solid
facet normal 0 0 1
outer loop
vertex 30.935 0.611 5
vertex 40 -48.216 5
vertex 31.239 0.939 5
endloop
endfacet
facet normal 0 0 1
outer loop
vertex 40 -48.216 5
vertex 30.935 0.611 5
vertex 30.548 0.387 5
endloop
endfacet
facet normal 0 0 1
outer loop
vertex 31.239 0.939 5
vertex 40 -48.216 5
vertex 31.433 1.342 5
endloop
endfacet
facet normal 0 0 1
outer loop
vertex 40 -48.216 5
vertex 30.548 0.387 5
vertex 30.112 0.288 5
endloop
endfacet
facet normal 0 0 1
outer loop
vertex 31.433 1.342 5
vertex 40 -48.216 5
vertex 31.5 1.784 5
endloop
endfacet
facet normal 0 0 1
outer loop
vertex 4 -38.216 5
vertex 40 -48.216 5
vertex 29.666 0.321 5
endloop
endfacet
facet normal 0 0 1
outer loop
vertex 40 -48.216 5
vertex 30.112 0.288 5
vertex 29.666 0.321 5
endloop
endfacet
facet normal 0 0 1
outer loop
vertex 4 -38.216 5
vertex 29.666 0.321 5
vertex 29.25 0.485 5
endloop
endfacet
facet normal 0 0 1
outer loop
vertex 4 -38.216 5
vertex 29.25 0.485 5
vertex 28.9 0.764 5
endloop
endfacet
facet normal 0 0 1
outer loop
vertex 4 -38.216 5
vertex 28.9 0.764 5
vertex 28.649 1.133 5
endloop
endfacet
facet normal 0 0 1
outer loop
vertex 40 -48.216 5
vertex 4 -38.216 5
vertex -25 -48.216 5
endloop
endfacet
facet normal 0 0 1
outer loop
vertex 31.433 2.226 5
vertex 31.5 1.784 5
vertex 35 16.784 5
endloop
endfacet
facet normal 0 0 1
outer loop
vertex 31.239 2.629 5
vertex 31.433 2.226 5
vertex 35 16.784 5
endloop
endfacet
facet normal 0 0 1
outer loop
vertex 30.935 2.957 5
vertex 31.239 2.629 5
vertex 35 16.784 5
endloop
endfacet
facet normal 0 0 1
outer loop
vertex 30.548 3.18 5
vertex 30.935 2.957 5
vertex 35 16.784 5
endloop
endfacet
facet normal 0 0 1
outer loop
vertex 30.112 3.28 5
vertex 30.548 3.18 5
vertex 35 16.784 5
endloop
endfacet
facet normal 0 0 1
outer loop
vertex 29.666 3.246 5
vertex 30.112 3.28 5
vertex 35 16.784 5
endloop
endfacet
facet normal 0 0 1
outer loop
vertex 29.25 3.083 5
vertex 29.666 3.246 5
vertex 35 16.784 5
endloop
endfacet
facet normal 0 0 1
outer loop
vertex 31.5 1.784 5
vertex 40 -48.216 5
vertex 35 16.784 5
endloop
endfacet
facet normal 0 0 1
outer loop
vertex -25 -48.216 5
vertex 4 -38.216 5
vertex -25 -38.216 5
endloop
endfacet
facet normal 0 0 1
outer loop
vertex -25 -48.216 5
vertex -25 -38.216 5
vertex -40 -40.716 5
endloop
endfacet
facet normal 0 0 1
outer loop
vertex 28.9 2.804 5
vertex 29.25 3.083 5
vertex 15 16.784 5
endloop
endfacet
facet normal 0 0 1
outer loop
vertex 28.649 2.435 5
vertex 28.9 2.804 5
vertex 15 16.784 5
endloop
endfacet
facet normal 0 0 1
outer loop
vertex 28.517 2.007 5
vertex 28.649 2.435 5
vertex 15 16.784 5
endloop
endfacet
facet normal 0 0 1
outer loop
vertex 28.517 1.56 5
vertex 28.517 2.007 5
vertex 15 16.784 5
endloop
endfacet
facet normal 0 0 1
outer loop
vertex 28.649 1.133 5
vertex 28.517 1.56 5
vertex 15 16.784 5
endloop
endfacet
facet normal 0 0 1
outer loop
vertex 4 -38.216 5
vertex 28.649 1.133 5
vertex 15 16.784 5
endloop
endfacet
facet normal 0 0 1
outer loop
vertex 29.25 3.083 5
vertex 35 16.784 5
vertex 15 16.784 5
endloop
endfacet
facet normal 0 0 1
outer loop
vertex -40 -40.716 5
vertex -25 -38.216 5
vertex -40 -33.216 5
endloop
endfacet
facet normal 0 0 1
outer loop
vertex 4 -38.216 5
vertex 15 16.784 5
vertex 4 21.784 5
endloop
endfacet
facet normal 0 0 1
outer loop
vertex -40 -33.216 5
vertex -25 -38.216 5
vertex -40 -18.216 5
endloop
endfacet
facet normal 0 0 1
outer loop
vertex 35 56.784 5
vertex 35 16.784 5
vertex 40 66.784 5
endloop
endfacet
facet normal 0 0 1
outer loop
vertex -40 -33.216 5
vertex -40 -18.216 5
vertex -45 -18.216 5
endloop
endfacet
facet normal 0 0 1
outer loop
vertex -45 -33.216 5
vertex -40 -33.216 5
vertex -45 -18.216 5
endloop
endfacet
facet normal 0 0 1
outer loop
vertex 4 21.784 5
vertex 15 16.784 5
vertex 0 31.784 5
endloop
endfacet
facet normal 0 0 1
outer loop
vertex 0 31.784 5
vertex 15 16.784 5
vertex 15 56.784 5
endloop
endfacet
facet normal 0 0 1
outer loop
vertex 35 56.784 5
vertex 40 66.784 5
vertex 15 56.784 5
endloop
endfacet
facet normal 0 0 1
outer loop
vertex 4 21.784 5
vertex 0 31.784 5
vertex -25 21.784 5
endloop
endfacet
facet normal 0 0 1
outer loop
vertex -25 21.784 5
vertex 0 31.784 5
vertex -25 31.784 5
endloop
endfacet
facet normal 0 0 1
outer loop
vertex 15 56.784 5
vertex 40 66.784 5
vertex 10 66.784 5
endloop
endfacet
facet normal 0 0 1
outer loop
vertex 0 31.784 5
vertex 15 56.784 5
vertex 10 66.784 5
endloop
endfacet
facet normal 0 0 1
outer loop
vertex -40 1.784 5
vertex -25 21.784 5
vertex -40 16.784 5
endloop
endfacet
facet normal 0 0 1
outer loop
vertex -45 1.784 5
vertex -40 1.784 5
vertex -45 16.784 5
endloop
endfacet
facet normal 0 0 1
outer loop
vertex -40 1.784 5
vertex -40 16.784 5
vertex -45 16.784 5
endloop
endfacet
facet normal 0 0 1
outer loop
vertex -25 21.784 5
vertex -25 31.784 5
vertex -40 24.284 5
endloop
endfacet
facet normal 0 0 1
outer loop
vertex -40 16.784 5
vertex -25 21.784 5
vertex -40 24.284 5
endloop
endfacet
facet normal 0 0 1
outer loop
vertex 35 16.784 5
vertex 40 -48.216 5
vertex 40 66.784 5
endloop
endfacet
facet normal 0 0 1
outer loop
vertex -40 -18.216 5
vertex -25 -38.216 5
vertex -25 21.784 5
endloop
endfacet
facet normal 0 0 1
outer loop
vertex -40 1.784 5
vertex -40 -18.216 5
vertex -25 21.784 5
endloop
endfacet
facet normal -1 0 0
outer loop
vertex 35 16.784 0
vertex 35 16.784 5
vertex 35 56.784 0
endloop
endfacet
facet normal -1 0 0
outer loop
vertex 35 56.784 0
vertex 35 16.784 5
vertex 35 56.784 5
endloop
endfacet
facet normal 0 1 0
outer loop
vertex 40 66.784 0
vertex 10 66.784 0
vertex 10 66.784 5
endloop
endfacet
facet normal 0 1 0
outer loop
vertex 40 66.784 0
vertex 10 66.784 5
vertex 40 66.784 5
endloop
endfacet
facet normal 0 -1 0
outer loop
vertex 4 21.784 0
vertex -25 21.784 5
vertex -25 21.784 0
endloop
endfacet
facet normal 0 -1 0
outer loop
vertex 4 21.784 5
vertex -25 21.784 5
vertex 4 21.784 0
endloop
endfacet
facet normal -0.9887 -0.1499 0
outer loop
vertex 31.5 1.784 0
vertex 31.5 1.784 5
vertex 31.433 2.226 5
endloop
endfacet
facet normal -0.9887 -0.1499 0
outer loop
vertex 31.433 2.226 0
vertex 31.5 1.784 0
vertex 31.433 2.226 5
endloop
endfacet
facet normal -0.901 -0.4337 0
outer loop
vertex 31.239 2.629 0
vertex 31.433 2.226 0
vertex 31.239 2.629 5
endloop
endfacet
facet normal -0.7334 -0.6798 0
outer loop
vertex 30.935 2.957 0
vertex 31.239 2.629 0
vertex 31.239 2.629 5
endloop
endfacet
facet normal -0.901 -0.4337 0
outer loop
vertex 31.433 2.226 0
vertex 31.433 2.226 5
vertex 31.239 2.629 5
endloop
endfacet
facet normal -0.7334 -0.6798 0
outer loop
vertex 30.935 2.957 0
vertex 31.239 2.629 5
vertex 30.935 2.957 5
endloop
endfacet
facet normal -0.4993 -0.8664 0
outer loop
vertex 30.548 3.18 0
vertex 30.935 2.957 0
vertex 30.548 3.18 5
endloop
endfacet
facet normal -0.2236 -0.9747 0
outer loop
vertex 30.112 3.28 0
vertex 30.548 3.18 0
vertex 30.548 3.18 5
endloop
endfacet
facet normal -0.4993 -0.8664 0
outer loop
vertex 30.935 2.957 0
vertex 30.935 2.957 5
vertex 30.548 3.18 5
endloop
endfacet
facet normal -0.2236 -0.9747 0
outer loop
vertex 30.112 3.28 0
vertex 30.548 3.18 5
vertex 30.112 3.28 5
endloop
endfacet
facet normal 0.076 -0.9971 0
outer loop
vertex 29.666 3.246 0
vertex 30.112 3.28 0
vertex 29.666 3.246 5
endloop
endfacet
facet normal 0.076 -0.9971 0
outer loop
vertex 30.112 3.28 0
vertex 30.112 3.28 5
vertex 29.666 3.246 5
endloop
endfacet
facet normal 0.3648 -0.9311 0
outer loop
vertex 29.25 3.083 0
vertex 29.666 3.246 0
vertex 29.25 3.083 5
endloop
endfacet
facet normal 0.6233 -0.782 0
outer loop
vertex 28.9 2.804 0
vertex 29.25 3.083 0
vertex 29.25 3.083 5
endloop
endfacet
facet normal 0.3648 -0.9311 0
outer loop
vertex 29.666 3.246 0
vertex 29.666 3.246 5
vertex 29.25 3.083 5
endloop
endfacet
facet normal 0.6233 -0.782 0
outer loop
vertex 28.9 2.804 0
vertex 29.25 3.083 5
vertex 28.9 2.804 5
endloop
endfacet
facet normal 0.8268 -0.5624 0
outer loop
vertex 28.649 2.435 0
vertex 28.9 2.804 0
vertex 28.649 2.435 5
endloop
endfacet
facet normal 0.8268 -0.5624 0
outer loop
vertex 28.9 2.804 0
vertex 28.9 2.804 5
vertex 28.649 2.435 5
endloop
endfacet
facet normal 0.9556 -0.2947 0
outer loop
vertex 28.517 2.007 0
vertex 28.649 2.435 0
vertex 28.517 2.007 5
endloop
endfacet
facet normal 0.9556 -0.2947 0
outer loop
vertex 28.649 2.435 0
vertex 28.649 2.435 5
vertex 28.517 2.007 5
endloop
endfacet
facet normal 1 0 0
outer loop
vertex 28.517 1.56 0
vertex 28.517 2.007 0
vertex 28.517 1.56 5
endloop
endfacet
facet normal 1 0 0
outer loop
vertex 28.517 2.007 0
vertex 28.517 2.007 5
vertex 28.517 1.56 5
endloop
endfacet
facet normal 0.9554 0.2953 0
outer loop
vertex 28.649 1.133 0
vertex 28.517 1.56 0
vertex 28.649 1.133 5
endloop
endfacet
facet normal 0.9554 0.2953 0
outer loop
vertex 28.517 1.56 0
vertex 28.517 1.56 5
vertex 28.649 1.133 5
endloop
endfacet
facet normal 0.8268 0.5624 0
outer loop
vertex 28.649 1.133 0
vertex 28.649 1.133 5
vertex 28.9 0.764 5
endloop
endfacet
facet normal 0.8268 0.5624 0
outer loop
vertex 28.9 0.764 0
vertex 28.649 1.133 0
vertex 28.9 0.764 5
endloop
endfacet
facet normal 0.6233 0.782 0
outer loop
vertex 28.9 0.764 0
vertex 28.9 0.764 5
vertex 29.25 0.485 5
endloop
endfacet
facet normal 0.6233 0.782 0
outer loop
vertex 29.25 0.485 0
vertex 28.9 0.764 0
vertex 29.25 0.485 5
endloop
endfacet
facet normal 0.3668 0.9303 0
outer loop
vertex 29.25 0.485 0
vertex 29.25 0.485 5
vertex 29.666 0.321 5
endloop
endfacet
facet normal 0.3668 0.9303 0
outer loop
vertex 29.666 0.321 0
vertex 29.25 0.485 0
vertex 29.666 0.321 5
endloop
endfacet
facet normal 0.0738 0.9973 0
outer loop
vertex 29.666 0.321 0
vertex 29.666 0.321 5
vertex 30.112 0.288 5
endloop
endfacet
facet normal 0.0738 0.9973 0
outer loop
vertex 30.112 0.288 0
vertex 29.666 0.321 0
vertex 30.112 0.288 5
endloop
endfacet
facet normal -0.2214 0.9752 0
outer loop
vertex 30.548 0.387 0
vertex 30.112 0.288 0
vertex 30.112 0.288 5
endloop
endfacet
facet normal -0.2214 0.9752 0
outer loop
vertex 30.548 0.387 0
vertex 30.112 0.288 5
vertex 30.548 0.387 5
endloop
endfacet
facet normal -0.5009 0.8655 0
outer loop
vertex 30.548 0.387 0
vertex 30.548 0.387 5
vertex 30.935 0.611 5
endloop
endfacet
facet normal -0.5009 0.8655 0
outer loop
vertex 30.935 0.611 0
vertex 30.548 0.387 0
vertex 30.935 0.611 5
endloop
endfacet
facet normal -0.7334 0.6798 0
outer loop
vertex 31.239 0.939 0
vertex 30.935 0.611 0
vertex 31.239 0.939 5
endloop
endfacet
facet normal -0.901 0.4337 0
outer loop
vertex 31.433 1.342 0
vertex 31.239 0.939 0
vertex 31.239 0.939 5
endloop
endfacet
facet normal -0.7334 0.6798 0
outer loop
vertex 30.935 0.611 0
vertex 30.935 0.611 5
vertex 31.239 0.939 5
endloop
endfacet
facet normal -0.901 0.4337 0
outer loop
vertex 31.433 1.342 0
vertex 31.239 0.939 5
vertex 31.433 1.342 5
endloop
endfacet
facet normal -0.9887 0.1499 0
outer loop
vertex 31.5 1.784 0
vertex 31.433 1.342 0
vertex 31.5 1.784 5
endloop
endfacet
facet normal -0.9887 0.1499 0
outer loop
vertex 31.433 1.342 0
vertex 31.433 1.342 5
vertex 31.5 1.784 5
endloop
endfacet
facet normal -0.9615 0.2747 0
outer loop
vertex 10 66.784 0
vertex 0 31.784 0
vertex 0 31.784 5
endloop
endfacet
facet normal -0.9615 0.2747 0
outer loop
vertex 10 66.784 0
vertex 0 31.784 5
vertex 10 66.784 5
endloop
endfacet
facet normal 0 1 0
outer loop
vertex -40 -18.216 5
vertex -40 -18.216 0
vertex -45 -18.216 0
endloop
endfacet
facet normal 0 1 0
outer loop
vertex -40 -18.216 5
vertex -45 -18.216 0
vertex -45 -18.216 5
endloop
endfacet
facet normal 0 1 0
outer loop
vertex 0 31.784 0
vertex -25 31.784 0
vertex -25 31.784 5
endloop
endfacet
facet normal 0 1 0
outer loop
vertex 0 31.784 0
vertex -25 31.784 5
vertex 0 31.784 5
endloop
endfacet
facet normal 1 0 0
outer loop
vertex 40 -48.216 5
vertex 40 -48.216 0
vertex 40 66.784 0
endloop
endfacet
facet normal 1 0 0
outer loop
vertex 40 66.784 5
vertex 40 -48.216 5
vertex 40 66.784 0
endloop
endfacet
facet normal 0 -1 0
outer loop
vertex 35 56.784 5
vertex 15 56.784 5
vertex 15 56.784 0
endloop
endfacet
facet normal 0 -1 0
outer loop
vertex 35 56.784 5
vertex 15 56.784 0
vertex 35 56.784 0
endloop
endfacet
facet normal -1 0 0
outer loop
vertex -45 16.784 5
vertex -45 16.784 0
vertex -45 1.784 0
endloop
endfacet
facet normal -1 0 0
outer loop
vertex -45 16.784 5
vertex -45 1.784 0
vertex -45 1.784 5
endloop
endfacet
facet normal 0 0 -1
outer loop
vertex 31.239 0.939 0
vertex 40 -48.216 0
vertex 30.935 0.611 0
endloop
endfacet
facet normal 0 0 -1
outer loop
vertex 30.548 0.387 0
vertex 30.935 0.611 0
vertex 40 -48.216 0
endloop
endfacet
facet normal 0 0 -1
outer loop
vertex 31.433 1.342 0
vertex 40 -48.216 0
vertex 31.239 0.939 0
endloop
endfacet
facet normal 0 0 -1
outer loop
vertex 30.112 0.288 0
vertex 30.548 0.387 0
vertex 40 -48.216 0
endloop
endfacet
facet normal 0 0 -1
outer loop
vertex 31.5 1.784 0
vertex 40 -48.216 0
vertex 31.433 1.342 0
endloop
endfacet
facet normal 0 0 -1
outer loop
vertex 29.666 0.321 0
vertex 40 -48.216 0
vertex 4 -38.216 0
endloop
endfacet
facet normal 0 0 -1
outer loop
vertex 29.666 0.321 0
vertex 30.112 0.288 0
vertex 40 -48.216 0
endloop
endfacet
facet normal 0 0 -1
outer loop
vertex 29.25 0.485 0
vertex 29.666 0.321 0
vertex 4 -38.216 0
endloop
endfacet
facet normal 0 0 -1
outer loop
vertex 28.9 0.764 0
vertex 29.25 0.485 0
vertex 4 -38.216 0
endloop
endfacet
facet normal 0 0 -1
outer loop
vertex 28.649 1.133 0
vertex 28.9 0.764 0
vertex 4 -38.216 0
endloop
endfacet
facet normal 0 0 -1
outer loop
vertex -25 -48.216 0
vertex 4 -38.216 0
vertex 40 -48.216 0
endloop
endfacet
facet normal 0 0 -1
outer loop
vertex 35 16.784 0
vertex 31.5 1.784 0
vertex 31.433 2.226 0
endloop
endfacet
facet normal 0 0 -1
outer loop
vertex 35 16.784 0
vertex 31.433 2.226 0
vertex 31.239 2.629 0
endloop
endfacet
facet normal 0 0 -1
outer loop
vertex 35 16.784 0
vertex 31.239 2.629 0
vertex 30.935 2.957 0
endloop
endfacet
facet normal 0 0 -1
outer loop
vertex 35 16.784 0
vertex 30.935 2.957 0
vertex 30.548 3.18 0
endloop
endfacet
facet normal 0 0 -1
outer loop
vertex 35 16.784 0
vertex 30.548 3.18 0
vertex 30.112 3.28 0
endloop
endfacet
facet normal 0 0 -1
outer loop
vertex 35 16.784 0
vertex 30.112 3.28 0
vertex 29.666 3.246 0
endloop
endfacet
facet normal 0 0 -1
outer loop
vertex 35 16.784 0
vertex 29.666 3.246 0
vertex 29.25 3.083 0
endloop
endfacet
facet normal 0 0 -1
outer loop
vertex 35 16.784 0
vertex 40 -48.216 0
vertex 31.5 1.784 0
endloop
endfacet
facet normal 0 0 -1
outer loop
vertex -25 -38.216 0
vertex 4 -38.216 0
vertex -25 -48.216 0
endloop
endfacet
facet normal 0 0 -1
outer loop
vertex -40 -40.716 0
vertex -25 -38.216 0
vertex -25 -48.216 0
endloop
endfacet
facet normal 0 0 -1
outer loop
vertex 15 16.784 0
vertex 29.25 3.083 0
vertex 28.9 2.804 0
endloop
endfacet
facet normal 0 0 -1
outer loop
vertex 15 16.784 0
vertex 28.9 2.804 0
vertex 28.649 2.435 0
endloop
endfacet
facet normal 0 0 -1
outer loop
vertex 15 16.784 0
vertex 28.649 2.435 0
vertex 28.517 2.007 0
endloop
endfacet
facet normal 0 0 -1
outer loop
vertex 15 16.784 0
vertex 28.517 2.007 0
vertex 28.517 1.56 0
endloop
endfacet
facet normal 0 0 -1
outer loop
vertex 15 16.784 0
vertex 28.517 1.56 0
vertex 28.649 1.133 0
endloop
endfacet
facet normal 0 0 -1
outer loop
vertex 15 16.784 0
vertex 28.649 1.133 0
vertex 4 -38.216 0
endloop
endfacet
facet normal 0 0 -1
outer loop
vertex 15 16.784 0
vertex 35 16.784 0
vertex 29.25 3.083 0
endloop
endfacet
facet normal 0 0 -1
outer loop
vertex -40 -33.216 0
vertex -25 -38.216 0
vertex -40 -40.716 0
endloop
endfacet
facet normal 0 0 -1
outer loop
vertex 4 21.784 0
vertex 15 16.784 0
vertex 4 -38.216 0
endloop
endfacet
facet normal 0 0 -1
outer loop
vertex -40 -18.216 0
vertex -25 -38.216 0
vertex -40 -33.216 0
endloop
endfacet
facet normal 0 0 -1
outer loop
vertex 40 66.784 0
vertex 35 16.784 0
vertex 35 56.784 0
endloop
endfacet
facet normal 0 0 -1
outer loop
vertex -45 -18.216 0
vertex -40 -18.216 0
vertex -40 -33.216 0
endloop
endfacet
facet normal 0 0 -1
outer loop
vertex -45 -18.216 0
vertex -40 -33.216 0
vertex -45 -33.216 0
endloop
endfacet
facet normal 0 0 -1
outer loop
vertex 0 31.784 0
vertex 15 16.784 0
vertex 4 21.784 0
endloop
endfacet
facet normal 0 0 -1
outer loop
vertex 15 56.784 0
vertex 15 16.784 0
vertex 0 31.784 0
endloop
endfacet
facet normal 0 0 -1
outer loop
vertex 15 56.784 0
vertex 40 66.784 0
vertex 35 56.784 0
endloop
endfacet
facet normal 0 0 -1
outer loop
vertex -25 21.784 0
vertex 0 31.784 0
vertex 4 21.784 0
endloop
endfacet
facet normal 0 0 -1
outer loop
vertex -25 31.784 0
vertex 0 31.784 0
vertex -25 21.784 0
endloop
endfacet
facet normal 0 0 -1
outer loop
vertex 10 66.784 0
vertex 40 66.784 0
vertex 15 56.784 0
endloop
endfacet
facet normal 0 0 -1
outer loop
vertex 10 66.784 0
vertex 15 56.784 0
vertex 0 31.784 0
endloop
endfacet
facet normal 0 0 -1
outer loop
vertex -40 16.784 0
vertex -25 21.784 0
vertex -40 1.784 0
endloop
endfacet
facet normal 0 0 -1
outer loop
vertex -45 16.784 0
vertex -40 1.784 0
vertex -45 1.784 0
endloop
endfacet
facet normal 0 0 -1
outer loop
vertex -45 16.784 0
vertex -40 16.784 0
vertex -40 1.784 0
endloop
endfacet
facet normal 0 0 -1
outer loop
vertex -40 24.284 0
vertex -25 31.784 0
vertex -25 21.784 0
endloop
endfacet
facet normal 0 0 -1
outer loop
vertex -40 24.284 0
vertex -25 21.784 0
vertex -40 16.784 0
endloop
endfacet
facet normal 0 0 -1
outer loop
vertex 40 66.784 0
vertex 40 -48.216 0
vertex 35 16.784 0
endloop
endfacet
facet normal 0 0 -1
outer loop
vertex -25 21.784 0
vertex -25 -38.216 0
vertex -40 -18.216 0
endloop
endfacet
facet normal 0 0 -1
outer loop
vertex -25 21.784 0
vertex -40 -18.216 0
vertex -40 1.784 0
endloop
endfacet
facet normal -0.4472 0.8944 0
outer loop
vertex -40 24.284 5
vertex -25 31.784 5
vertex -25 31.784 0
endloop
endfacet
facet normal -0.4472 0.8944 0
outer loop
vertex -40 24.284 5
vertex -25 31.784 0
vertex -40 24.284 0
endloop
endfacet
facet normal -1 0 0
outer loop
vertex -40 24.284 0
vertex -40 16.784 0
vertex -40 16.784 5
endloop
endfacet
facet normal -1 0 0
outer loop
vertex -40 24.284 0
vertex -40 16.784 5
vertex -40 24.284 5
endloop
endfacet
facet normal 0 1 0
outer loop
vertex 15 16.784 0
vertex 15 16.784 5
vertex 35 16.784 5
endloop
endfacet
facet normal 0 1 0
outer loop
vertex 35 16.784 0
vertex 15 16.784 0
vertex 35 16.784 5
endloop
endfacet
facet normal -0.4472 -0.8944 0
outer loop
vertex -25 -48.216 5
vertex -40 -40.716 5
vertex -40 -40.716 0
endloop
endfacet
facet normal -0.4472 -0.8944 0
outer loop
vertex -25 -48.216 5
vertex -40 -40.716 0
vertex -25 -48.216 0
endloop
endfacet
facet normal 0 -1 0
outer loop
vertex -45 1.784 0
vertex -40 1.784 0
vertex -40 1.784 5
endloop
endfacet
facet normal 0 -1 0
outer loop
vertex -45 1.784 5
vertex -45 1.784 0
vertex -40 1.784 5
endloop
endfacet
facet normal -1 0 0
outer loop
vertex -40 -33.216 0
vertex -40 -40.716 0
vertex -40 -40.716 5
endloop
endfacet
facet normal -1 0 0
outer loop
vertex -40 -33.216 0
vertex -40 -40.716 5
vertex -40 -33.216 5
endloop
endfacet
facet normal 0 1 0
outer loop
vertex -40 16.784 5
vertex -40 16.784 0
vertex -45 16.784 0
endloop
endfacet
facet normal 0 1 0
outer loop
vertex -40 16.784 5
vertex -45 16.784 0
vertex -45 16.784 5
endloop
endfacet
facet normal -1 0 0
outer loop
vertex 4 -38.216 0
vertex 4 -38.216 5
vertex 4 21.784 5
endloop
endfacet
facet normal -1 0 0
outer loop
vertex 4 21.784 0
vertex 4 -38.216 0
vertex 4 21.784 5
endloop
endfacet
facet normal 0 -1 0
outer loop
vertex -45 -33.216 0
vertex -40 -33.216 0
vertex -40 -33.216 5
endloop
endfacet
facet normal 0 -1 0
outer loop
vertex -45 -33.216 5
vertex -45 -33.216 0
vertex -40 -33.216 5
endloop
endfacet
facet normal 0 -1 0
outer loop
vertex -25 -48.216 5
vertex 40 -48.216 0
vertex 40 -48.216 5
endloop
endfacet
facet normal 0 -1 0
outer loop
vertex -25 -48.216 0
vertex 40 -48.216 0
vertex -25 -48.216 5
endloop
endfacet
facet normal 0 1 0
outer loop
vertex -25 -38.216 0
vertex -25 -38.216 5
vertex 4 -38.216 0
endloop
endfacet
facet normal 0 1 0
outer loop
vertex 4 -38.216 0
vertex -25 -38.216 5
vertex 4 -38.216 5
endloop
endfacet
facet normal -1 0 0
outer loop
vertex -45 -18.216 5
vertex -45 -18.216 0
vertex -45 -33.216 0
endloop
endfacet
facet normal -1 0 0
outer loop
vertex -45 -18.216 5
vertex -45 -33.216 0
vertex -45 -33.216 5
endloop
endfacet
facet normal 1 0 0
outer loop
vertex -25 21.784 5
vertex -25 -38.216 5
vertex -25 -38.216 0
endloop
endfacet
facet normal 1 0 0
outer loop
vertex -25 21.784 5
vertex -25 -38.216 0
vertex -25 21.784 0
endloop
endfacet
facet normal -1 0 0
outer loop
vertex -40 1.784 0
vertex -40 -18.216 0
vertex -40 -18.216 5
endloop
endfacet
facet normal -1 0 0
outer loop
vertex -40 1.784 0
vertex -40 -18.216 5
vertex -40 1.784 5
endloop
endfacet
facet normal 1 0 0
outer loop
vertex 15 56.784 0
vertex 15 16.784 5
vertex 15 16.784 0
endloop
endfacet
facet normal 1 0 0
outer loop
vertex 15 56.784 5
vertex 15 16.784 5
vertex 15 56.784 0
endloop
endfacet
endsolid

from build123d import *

# Parameters (mm, degrees)
BOSS_EXTRUDE1_DEPTH = 5
SKETCH2_W           = 29
SKETCH2_H           = 60
SKETCH2_W_2         = 20
SKETCH2_H_2         = 40
CUT_EXTRUDE1_DEPTH  = 5
SKETCH3_W           = 5
SKETCH3_H           = 15
BOSS_EXTRUDE2_DEPTH = 5
CUT_EXTRUDE2_DEPTH  = 5
SKETCH5_R           = 1.5
CUT_EXTRUDE3_DEPTH  = 5


with BuildPart() as part:
    # Sketch1 → Boss-Extrude1 (new body)
    with BuildSketch(Plane.XY):
        Polygon((0, 31.783783784), (10, 66.783783784), (40, 66.783783784), (40, 21.783783784), (40, -48.216216216), (-40, -48.216216216), (-40, 31.783783784), align=None)
    extrude(amount=BOSS_EXTRUDE1_DEPTH)

    # Sketch2 → Cut-Extrude1 (cut)
    with BuildSketch(Plane.XY.offset(5)):
        with Locations((-10.5, -8.216216216)):
            Rectangle(SKETCH2_W, SKETCH2_H)
        with Locations((25, 36.783783784)):
            Rectangle(SKETCH2_W_2, SKETCH2_H_2)
    extrude(amount=-CUT_EXTRUDE1_DEPTH, mode=Mode.SUBTRACT)

    # Sketch3 → Boss-Extrude2 (add)
    with BuildSketch(Plane.ZY.offset(40)):
        with Locations((2.5, 9.283783784)):
            Rectangle(SKETCH3_W, SKETCH3_H)
        with Locations((2.5, -25.716216216)):
            Rectangle(SKETCH3_W, SKETCH3_H)
    extrude(amount=BOSS_EXTRUDE2_DEPTH)

    # Sketch4 → Cut-Extrude2 (cut)
    with BuildSketch(Plane.XY.offset(5)):
        Polygon((-40, 31.783783784), (-25, 31.783783784), (-40, 24.283783784), align=None)
        Polygon((-40, -48.216216216), (-40, -40.716216216), (-25, -48.216216216), align=None)
    extrude(amount=-CUT_EXTRUDE2_DEPTH, mode=Mode.SUBTRACT)

    # Sketch5 → Cut-Extrude3 (cut)
    with BuildSketch(Plane.XY.offset(5)):
        with Locations((30, 1.783783784)):
            Circle(SKETCH5_R)
    extrude(amount=-CUT_EXTRUDE3_DEPTH, mode=Mode.SUBTRACT)


solid = part.part
